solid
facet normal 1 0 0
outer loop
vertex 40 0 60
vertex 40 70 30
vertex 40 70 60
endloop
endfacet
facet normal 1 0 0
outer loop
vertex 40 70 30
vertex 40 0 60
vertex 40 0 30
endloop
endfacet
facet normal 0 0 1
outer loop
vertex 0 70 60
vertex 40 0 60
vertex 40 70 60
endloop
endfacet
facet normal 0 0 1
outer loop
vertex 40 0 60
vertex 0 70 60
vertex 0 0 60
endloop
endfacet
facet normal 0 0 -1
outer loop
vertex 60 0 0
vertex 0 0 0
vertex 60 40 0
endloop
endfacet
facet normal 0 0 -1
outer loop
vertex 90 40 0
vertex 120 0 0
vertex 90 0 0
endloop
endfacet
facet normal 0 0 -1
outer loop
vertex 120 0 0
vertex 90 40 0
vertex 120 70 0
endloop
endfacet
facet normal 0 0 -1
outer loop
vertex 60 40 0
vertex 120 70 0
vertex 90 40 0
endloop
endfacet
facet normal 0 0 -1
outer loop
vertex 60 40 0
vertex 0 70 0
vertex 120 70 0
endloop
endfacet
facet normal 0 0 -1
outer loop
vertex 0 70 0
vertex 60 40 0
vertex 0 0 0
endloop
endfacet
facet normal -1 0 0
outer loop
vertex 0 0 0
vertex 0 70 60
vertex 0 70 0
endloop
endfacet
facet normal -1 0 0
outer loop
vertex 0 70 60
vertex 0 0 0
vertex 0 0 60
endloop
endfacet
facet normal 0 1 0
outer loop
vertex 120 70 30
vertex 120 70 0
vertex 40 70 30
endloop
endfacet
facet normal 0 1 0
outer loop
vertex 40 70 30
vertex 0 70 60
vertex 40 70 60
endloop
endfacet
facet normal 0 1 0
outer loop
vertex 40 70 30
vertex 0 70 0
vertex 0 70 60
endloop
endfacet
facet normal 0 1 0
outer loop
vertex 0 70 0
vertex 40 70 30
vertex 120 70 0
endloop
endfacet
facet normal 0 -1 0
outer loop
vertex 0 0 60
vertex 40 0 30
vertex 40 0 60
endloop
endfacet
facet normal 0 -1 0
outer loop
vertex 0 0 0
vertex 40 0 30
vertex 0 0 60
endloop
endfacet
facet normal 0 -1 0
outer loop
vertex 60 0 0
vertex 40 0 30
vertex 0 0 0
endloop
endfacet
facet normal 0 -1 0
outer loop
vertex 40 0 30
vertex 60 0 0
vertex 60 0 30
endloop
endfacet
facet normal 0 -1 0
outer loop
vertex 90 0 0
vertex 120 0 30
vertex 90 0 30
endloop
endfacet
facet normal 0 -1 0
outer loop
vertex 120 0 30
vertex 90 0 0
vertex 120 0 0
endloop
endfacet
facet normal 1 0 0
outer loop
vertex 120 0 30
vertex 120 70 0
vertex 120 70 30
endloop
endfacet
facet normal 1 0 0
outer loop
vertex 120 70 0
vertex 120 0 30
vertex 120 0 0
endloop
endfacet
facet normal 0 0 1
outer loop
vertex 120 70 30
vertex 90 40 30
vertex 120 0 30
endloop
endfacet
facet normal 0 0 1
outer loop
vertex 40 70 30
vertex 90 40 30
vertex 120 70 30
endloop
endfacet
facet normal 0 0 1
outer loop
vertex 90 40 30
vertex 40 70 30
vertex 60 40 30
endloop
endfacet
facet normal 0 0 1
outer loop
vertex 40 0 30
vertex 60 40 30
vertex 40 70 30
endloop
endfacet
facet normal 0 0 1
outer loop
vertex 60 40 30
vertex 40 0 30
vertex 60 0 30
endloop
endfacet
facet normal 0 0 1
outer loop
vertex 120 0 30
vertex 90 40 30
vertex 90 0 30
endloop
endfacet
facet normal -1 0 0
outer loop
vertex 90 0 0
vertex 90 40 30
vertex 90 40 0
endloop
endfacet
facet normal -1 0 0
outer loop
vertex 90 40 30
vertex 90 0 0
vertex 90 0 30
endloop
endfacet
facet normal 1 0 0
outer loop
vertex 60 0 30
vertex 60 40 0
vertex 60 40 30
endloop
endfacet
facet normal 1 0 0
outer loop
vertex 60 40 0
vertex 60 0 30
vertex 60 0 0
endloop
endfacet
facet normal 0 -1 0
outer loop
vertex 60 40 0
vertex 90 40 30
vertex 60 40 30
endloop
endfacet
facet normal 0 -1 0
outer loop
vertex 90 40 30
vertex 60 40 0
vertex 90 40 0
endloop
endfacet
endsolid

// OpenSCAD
// Stepped block with a through slot, reconstructed from the orthographic views.
// Units: mm (proportions measured from the drawing; one grid unit = 10 mm).
// Axes: X = width (left to right in the Front view), Y = depth (front face at Y = 0),
//       Z = height.

W      = 120;  // overall width
D      = 70;   // overall depth
H      = 60;   // height of the tall block
H_low  = 30;   // height of the lower (right) block
W_tall = 40;   // width of the tall block on the left

slot_x = 60;   // slot starts this far from the left end
slot_w = 30;   // slot width
slot_d = 40;   // slot depth, measured back from the front face

eps = 0.01;    // overlap so the cut is clean

difference() {
    union() {
        cube([W_tall, D, H]);        // tall block (left)
        cube([W, D, H_low]);         // lower block (full width)
    }
    // Slot open at the front, running through the full height of the lower block
    translate([slot_x, -eps, -eps])
        cube([slot_w, slot_d + eps, H_low + 2*eps]);
}
